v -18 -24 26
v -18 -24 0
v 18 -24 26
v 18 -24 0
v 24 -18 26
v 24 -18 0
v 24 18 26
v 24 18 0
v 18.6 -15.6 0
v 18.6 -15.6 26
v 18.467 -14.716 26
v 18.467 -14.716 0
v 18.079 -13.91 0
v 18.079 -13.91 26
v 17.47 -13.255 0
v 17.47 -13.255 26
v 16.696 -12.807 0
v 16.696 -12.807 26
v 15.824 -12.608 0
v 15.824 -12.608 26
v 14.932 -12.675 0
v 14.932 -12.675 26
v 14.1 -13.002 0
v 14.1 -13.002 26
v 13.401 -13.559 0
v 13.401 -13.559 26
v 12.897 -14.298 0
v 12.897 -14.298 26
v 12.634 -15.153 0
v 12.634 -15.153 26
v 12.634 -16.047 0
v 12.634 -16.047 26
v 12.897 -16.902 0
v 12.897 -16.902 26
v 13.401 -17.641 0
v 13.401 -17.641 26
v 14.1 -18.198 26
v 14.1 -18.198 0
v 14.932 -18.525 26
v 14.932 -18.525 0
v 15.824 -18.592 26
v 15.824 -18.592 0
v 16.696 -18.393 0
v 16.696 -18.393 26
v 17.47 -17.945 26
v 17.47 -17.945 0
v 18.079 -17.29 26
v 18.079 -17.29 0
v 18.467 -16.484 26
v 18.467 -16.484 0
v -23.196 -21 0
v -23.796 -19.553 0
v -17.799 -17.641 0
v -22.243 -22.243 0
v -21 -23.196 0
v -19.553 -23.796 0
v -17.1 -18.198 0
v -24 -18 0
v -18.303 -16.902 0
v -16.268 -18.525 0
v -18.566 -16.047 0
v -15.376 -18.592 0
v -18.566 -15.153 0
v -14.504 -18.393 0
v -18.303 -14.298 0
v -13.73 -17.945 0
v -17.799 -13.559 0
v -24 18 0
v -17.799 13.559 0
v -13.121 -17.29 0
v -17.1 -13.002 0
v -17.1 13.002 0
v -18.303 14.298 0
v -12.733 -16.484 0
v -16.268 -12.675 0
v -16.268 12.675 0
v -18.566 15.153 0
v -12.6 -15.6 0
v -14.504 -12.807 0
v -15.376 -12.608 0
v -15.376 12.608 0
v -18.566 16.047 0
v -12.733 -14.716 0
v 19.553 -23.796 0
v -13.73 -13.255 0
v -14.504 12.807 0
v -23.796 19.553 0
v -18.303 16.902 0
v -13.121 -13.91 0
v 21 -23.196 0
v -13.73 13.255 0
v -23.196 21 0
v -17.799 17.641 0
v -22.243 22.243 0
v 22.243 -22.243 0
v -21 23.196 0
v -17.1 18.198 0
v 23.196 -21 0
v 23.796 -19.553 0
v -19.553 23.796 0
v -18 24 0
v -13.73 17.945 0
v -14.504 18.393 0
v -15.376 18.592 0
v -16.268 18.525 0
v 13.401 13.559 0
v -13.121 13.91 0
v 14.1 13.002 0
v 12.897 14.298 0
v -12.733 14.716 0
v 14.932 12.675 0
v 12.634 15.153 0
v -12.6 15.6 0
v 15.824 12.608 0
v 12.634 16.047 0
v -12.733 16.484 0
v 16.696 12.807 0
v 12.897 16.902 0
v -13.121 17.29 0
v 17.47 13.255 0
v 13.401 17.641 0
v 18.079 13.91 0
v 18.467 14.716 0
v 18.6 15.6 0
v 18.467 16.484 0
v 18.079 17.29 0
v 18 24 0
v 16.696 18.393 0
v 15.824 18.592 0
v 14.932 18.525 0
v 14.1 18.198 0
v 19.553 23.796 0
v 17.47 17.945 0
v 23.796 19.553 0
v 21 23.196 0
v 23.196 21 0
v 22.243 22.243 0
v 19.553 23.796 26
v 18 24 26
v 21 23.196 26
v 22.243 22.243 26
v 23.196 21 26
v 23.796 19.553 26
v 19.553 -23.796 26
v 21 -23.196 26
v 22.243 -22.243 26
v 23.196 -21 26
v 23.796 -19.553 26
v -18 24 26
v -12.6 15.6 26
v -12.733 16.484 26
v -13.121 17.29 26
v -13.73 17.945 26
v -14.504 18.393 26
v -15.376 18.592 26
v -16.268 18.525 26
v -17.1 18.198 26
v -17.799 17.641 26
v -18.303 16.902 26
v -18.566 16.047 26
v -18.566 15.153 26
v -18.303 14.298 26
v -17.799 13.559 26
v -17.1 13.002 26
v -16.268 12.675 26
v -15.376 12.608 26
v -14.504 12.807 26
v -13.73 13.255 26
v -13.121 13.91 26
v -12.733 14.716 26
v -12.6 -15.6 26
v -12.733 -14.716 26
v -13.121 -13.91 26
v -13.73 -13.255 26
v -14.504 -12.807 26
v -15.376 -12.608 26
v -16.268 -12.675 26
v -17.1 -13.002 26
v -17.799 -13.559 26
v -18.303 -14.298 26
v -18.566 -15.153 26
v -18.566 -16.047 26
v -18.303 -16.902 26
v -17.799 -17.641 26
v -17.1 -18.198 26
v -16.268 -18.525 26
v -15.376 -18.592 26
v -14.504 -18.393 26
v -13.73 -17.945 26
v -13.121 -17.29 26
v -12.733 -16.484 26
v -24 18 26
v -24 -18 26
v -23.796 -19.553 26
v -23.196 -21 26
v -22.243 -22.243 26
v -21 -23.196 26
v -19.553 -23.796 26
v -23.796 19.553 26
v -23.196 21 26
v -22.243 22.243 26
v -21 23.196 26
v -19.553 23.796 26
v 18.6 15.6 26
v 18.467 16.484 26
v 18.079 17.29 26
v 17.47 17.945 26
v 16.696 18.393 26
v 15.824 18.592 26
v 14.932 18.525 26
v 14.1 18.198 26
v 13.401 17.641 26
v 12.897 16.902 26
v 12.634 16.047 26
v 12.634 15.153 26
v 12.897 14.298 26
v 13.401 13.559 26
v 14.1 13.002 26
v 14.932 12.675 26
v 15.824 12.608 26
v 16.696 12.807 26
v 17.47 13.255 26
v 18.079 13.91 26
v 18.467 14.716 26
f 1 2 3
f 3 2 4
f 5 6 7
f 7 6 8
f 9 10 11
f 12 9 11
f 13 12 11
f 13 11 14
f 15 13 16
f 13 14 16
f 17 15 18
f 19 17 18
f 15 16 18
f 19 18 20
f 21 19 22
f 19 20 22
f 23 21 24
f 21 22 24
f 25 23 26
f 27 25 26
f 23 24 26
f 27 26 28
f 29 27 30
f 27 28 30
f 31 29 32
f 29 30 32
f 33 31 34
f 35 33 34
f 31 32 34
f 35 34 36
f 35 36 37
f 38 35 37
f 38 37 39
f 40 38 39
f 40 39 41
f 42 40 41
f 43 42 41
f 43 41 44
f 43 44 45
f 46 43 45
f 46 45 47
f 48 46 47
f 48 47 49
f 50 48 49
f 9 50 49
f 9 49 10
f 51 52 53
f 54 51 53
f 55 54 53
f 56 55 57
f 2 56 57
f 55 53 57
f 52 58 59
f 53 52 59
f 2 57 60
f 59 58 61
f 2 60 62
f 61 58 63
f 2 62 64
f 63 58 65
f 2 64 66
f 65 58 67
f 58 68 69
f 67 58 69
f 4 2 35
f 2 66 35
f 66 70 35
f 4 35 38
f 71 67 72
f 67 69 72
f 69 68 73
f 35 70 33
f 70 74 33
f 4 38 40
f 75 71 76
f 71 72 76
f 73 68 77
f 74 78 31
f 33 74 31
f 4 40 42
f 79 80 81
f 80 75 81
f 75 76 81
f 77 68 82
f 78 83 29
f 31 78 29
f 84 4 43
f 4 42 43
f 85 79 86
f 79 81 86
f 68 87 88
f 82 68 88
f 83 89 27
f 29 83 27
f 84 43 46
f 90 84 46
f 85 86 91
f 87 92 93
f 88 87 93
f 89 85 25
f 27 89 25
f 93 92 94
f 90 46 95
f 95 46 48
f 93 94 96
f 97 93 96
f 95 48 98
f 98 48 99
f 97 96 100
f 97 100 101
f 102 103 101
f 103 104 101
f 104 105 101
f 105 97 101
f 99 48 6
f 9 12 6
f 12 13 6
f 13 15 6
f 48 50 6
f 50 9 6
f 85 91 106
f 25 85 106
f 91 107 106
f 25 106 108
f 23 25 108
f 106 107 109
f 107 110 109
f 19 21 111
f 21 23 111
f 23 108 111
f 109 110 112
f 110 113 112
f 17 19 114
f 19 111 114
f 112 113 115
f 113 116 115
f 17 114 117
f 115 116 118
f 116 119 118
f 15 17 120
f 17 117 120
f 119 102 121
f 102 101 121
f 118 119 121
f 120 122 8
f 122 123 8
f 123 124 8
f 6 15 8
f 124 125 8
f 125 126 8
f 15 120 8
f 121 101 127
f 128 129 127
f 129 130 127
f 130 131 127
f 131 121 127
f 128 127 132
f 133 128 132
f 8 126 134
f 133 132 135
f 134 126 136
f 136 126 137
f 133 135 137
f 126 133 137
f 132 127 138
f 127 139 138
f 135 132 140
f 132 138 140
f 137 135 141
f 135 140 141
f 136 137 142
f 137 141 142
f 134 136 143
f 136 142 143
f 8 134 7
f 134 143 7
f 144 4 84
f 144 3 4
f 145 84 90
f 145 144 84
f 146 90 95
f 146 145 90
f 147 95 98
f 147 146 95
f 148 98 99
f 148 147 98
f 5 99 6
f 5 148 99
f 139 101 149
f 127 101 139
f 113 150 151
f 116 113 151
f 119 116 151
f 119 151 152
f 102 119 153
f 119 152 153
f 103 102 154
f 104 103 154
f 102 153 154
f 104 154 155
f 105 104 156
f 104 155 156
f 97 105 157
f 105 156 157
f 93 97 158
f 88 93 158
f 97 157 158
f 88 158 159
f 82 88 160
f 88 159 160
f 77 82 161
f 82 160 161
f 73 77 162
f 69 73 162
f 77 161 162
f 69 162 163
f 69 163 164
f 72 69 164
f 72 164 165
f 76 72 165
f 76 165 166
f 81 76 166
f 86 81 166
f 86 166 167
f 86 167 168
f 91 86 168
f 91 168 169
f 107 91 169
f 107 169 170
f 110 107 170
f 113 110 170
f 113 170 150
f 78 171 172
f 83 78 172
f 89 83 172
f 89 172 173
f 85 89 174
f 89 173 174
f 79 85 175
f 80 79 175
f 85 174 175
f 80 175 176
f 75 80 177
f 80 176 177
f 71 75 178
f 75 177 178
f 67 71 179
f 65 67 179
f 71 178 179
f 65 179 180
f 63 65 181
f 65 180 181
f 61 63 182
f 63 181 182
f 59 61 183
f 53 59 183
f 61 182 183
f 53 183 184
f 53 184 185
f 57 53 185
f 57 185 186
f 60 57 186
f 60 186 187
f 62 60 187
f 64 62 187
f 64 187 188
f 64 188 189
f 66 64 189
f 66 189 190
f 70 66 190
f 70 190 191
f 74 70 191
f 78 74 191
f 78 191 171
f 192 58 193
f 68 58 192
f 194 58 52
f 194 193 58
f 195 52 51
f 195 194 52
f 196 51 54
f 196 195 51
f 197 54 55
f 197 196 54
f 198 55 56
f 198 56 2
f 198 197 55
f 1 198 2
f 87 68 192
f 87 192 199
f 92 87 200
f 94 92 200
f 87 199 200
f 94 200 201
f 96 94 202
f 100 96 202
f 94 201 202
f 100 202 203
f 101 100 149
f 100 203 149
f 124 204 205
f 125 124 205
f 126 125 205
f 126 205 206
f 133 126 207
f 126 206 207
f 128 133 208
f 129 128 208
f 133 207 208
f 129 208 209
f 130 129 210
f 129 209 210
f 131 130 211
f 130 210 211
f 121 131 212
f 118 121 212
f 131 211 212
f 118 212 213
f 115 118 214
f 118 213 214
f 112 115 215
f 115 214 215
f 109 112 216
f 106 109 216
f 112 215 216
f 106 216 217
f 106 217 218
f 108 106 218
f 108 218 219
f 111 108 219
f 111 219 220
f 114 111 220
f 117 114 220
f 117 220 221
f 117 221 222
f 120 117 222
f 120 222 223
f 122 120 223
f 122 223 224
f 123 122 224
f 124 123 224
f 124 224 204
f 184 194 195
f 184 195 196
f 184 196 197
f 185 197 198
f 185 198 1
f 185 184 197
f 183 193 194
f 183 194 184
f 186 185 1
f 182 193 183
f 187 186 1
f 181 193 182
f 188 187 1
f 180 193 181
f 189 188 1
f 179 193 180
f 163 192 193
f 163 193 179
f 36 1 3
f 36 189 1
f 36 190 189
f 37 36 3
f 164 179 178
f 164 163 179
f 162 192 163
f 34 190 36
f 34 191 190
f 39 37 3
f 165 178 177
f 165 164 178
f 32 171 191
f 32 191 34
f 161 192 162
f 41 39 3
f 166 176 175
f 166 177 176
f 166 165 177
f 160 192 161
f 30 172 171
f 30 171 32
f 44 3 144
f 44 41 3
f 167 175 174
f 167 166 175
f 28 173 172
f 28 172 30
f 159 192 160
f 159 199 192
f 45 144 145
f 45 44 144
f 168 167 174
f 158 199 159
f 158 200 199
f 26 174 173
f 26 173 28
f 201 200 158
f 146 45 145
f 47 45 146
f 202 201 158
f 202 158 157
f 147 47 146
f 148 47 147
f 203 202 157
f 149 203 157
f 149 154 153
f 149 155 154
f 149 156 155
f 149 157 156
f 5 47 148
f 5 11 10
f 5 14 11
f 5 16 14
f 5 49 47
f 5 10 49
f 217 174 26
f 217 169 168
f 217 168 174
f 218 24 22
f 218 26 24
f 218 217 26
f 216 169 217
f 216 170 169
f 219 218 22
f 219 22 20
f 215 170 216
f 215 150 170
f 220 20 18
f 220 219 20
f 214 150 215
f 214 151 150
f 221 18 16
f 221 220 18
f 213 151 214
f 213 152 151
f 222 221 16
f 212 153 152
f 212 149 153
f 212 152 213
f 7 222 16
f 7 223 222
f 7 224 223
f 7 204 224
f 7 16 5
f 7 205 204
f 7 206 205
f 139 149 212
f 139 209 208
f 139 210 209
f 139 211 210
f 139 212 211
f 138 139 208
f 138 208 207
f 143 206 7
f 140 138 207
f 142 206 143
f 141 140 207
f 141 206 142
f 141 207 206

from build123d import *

# Parameters (mm, degrees)
ESBO_O1_W                = 48
ESBO_O1_H                = 48
RESSALTO_EXTRUS_O1_DEPTH = 26
ESBO_O3_R                = 3
CORTE_EXTRUS_O2_DEPTH    = 27
FILETE2_R                = 6


with BuildPart() as part:
    # Esboço1 → Ressalto-extrusão1 (new body)
    with BuildSketch(Plane.XY):
        Rectangle(ESBO_O1_W, ESBO_O1_H)
    extrude(amount=RESSALTO_EXTRUS_O1_DEPTH)

    # Esboço3 → Corte-extrusão2 (cut, through all)
    with BuildSketch(Plane.XY.offset(26)):
        with Locations((-15.6, -15.6)):
            Circle(ESBO_O3_R)
        with Locations((-15.6, 15.6)):
            Circle(ESBO_O3_R)
        with Locations((15.6, -15.6)):
            Circle(ESBO_O3_R)
        with Locations((15.6, 15.6)):
            Circle(ESBO_O3_R)
    extrude(amount=-CORTE_EXTRUS_O2_DEPTH, mode=Mode.SUBTRACT)

    # Filete2
    filete2_edges = [part.edges().sort_by_distance(p)[0] for p in [
        (24, -24, 13),
        (-24, -24, 13),
        (-24, 24, 13),
        (24, 24, 13),
    ]]
    fillet(filete2_edges, radius=FILETE2_R)


solid = part.part
